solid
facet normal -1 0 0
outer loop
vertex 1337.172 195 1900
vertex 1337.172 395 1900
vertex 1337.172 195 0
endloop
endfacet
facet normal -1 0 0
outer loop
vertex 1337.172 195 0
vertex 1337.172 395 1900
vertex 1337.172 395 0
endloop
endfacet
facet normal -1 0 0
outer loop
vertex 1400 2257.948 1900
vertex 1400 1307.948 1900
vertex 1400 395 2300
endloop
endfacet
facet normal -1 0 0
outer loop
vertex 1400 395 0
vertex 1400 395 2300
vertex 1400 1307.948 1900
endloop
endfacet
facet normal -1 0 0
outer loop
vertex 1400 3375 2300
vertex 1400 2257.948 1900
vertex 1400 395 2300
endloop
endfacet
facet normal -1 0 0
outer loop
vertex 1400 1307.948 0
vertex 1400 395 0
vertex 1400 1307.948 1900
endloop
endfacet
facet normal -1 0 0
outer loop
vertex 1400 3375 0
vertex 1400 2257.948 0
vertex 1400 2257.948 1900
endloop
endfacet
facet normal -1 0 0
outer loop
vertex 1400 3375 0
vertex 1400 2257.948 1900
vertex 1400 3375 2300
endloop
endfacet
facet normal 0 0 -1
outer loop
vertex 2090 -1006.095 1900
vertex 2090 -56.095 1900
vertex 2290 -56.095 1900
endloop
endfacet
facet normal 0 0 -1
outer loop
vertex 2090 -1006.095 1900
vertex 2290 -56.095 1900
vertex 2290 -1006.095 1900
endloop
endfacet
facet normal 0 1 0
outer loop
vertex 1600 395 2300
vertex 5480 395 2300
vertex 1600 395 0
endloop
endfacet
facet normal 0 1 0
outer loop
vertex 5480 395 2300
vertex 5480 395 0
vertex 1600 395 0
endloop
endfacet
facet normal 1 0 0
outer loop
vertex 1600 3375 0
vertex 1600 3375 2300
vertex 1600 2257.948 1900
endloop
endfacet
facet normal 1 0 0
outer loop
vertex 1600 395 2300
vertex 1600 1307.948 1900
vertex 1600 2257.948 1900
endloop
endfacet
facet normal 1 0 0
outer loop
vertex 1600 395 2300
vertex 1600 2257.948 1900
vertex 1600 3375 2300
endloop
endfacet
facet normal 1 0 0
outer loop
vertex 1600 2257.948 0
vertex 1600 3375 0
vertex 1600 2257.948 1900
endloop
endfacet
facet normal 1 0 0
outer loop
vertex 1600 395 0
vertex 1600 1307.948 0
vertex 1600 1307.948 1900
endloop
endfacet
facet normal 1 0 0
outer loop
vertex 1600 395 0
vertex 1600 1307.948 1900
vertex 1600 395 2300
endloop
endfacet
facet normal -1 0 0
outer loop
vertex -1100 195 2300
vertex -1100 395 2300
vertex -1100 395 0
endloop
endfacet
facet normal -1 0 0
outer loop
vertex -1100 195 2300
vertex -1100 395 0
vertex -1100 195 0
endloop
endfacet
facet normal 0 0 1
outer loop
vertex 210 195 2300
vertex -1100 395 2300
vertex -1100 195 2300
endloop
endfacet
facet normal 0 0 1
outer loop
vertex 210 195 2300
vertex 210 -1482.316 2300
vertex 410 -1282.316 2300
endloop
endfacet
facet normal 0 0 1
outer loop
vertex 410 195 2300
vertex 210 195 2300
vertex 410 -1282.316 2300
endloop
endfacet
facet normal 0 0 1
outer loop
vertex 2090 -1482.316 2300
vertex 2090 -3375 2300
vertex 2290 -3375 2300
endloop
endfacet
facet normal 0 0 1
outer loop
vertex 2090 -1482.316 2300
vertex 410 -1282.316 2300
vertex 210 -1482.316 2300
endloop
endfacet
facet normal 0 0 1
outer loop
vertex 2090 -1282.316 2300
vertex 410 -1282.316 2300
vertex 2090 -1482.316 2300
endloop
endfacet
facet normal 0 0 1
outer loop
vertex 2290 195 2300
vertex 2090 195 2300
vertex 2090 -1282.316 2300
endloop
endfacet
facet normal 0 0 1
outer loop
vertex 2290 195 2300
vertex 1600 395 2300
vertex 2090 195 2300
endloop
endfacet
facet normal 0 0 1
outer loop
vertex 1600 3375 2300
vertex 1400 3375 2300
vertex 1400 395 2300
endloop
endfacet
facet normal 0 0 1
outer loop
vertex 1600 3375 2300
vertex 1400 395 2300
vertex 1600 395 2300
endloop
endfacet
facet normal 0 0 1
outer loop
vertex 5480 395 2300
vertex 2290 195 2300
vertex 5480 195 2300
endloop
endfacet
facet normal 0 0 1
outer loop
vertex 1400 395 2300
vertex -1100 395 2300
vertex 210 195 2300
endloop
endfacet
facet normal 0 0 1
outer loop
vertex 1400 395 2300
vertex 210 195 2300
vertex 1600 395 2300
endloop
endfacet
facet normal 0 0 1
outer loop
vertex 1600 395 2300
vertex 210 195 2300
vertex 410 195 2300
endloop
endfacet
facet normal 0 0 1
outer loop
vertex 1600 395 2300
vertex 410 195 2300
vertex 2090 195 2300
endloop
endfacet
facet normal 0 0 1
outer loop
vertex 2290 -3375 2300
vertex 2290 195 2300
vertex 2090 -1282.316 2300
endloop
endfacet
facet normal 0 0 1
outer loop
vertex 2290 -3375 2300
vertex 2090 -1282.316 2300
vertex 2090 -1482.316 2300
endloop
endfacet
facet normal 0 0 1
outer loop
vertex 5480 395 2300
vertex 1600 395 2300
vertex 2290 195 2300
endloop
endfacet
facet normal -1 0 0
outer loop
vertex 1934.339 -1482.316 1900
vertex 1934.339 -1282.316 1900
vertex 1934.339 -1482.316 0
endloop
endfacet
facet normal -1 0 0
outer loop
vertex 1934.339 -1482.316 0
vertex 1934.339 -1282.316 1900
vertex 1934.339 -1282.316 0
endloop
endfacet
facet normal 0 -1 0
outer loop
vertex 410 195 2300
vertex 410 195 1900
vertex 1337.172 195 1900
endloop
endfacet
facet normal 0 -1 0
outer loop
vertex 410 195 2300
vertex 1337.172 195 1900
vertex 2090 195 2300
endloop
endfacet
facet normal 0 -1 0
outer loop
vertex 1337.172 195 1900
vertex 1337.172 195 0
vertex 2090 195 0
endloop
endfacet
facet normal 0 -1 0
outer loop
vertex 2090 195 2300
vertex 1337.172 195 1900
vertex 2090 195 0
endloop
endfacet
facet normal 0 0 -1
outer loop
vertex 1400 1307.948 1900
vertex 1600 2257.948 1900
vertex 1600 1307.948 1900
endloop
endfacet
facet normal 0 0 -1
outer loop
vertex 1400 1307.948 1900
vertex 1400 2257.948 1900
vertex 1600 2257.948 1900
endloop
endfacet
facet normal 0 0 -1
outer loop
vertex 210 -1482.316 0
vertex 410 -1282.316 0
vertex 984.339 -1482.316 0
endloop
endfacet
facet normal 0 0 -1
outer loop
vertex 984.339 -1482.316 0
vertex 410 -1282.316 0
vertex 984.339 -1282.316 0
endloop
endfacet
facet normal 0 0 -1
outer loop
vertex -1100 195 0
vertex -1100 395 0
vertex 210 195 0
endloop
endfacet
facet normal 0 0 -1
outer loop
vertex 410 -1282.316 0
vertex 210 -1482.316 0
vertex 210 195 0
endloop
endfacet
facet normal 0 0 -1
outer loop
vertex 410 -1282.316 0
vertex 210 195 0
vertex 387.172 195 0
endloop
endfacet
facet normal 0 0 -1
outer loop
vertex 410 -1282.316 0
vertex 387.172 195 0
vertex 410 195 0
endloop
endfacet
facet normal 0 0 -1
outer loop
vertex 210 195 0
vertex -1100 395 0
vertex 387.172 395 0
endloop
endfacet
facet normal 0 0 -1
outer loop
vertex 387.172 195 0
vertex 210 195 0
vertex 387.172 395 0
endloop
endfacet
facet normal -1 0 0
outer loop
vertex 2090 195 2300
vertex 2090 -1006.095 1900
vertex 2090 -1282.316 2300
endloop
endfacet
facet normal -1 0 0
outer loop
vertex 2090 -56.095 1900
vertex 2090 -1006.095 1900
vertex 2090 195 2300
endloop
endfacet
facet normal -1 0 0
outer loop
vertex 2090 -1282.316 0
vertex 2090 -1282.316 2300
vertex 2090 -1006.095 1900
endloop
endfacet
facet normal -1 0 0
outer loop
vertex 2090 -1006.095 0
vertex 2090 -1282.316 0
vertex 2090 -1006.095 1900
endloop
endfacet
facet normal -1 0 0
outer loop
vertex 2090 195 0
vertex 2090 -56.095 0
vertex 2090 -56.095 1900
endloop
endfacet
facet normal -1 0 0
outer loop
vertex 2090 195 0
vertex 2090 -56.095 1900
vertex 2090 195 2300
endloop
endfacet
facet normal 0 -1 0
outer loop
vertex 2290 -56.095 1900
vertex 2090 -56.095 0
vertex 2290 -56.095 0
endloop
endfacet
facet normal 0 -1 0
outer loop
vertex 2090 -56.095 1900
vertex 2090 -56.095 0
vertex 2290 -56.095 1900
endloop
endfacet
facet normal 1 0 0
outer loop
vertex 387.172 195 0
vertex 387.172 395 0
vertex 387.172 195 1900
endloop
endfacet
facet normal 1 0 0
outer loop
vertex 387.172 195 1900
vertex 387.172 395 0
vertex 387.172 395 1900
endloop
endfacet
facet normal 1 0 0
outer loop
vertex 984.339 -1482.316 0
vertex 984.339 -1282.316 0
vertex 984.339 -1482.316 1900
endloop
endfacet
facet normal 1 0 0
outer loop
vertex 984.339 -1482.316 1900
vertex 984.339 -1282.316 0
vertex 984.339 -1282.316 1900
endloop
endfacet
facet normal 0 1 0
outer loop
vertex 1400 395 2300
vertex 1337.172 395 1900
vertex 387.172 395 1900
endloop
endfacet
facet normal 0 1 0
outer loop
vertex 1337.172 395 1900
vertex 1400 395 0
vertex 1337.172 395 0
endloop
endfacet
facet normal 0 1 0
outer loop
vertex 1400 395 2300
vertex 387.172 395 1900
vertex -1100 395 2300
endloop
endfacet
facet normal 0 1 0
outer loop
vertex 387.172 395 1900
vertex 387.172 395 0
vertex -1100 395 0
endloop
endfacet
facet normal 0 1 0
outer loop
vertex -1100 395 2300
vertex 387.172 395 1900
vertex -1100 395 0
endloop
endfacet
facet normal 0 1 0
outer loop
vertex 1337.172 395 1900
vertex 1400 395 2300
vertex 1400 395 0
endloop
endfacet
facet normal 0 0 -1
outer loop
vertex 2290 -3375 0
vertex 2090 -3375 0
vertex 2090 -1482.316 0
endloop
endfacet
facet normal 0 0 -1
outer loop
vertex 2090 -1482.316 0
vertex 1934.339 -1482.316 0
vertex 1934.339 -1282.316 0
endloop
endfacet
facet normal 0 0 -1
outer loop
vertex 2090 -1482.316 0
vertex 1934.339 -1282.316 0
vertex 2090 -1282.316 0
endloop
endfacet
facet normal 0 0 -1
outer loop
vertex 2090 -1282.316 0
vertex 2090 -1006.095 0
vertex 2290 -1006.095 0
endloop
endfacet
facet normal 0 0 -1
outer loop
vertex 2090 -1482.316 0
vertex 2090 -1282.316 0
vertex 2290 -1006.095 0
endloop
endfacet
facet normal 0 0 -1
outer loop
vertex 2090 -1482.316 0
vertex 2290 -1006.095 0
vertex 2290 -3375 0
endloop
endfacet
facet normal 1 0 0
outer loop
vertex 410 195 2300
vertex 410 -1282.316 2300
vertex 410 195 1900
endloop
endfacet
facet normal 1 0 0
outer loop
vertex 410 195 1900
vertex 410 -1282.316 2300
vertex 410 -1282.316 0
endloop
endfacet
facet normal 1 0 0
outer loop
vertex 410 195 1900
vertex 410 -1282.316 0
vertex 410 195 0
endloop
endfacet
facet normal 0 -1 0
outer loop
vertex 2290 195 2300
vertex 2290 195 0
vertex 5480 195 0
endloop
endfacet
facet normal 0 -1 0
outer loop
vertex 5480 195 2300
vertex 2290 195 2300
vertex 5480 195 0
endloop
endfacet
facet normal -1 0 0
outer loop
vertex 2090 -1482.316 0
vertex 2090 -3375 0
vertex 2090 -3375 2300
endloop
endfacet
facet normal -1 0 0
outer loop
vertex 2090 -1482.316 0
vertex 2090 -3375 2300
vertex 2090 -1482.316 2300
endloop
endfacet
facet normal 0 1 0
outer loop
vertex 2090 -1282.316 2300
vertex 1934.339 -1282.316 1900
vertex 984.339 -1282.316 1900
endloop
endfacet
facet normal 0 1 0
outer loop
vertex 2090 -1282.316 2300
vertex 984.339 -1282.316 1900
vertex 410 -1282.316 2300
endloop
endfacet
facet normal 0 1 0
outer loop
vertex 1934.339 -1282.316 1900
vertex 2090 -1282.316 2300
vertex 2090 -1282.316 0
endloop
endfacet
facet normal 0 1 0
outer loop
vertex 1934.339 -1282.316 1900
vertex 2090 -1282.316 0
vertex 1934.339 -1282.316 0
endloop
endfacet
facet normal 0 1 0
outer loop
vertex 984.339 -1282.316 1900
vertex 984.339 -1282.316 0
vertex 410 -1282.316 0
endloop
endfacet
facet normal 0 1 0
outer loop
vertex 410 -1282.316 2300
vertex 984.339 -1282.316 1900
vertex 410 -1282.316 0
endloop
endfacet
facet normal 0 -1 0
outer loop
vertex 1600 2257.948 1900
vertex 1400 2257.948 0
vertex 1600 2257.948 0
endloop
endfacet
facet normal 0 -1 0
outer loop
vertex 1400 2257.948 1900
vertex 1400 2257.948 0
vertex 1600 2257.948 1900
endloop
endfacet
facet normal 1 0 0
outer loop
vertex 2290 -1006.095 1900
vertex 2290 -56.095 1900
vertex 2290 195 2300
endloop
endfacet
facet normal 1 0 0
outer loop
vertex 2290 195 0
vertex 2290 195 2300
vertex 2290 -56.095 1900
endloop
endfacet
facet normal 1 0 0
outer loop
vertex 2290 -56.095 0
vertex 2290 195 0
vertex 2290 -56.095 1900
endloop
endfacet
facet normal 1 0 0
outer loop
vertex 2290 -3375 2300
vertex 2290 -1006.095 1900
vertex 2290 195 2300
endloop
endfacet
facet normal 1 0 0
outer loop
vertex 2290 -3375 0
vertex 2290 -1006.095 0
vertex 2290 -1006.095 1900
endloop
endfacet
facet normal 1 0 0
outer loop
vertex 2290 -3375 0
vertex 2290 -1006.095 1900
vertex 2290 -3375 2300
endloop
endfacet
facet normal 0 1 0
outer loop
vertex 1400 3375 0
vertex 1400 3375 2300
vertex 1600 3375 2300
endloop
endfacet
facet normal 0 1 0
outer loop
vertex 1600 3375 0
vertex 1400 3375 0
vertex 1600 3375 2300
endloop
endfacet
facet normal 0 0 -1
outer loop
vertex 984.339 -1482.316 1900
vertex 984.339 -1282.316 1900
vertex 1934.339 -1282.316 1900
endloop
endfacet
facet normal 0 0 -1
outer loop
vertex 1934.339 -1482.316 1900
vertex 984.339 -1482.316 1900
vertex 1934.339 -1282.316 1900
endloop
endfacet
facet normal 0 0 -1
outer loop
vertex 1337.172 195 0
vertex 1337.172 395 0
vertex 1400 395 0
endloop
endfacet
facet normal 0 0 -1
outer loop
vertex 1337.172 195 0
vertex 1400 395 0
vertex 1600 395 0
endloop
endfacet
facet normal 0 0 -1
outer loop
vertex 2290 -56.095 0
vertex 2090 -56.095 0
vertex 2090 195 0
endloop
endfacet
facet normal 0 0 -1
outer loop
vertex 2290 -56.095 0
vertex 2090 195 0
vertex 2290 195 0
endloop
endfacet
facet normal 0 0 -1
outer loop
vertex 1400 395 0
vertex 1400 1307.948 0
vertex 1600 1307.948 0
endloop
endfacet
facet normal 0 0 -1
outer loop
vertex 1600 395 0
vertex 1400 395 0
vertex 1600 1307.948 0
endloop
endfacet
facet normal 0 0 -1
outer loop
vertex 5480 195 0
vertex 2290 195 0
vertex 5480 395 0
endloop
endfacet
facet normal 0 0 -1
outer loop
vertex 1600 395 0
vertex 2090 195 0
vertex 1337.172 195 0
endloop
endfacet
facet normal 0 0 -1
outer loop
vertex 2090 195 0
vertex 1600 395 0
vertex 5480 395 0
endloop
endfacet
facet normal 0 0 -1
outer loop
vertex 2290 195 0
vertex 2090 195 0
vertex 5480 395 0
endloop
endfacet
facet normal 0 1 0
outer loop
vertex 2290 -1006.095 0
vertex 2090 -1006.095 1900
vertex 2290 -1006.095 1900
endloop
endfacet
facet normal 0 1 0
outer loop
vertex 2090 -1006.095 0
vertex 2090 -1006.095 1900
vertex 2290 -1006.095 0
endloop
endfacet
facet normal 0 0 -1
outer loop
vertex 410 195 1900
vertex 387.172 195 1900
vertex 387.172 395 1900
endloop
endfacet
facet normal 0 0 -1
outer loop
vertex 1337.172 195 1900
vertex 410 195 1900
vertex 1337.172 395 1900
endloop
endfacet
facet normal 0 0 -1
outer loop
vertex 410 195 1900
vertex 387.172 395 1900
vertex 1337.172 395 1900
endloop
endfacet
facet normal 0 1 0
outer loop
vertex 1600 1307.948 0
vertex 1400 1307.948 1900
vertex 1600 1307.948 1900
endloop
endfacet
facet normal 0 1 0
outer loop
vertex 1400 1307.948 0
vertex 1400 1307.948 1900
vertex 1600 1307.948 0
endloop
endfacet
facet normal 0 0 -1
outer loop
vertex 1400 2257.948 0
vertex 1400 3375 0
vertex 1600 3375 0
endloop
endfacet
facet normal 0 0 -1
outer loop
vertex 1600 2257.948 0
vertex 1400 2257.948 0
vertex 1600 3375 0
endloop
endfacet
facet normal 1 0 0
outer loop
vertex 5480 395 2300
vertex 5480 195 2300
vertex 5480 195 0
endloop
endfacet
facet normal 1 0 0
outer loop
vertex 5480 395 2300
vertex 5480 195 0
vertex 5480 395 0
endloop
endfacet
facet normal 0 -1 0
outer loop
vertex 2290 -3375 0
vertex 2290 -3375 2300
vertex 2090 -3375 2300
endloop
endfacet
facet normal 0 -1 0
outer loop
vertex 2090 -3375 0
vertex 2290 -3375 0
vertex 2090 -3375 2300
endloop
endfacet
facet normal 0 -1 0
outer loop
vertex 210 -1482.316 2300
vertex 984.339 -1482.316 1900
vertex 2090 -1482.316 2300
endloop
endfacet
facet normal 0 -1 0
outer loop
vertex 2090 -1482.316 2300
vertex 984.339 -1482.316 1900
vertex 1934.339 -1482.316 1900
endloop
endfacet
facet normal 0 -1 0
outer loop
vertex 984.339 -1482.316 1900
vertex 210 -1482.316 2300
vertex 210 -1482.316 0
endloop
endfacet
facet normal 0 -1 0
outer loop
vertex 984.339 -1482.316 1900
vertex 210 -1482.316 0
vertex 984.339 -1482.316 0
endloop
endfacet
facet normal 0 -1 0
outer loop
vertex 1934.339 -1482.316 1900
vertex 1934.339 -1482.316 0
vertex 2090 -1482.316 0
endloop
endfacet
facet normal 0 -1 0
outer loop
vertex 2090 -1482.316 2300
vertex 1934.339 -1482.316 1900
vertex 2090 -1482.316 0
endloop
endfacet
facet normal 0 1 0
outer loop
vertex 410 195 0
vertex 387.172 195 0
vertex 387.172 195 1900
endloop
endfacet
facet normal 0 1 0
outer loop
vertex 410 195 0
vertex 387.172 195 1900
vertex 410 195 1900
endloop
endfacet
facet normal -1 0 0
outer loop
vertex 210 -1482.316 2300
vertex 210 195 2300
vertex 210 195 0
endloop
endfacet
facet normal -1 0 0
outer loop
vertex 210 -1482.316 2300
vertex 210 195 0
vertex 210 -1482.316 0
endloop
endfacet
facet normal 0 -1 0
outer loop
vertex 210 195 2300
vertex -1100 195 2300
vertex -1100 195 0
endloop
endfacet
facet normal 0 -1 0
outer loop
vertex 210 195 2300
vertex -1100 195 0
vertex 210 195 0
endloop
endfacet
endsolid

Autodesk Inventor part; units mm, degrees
ref_plane "YZ Plane" through (0, 0, 0) normal (1, 0, 0) x (0, 1, 0)
ref_plane "XZ Plane" through (0, 0, 0) normal (0, 1, 0) x (-1, 0, 0)
ref_plane "XY Plane" through (0, 0, 0) normal (0, 0, 1) x (1, 0, 0)
ref_plane "Arbeitsebene1" through (0, 0, 0) normal (0, 0, 1) x (1, 0, 0)
sketch "Skizze1" plane through (0, 0, 0) normal (0, 0, 1) x (1, 0, 0)
  line L0 (5680, -3575) -> (5680, 3575) projected
  line L1 (5680, 3575) -> (-5680, 3575) projected
  line L2 (-5680, 3575) -> (-5680, -3575) projected
  line L3 (-5680, -3575) -> (5680, -3575) projected
  line L4 (1400, 3375) -> (1600, 3375)
  line L5 (1600, 3375) -> (1600, 395)
  line L6 (1400, 395) -> (1400, 3375)
  line L7 (-1100, 395) -> (-1100, 195)
  line L8 (5480, 195) -> (5480, 395)
  line L9 (2290, 195) -> (2290, -3375)
  line L10 (2290, -3375) -> (2090, -3375)
  line L11 (5480, 395) -> (1600, 395)
  line L12 (1400, 395) -> (-1100, 395)
  line L13 (2290, 195) -> (5480, 195)
  line L14 (2090, -1282.3157) -> (410, -1282.3157)
  line L15 (210, -646.2385) -> (210, -1482.3157)
  line L16 (210, -1482.3157) -> (2090, -1482.3157)
  line L17 (210, 195) -> (210, -646.2385)
  line L18 (410, -1282.3157) -> (410, 195)
  line L19 (2090, -3375) -> (2090, -1482.3157)
  line L20 (2090, -1282.3157) -> (2090, 195)
  line L21 (-1100, 195) -> (210, 195)
  line L22 (410, 195) -> (2090, 195)
  line L23 (1430, 3375) -> (1430, 1814.9045) projected
  line L24 (1430, 1814.9045) -> (-1230, 1814.9045) projected
  line L25 (-1230, 1814.9045) -> (-1230, 3375) projected
  line L26 (-1230, 3375) -> (1430, 3375) projected
  dimension "d1" = 200
  dimension "d2" = 200
  dimension "d3" = 200
  dimension "d4" = 2980
  dimension "d6" = 200
  dimension "d8" = 200
  dimension "d9" = 2500
  dimension "d16" = 3880
  dimension "d26" = 200
  dimension "d27" = 200
  dimension "d28" = 1310
  dimension "d29" = 200
  dimension "d31" = 1680
extrude "Extrusion4" add sketch "Skizze1" along normal blind 2300 contours L4 L23 L24 L6 | L4 L5 L11 L8 L13 L9 L10 L19 L16 L15 L17 L21 L7 L12 L6 L24 L23
sketch "Skizze4" plane through (1400, 395, 0) normal (-1, 0, 0) x (0, 0, 1)
  line L0 (0, 0) -> (0, 2980) projected
  line L1 (0, 0) -> (2300, 0) projected
  line L2 (2300, 2980) -> (2300, 0) projected
  line L3 (0, 2980) -> (2300, 2980) projected
  line L4 (0, 0) -> (0, 2980) projected
  line L5 (0, 1862.9475) -> (1900, 1862.9475)
  line L6 (1900, 1862.9475) -> (1900, 912.9475)
  line L7 (1900, 912.9475) -> (0, 912.9475)
  line L8 (0, 912.9475) -> (0, 1862.9475)
  dimension "d34" = 950
  dimension "d35" = 1900
extrude "Extrusion5" cut sketch "Skizze4" against normal up to surface (200 mm away) contours L0 L5 L6 L7
sketch "Skizze5" plane through (-1100, 395, 0) normal (0, 1, 0) x (1, 0, 0)
  line L0 (0, 0) -> (2500, 0) projected
  line L1 (0, 0) -> (0, -2300) projected
  line L2 (2500, -2300) -> (0, -2300) projected
  line L3 (2500, 0) -> (2500, -2300) projected
  line L4 (0, 0) -> (2500, 0) projected
  line L5 (2437.1725, 0) -> (1487.1725, 0)
  line L6 (1487.1725, 0) -> (1487.1725, -1900)
  line L7 (1487.1725, -1900) -> (2437.1725, -1900)
  line L8 (2437.1725, -1900) -> (2437.1725, 0)
  dimension "d38" = 950
  dimension "d39" = 1900
extrude "Extrusion6" cut sketch "Skizze5" against normal up to surface (200 mm away) contours L0 L8 L7 L6
sketch "Skizze6" plane through (2090, -1282.3157, 0) normal (-1, 0, 0) x (0, 0, 1)
  line L0 (0, 0) -> (0, 1477.3157) projected
  line L1 (0, 0) -> (2300, 0) projected
  line L2 (2300, 1477.3157) -> (2300, 0) projected
  line L3 (0, 1477.3157) -> (2300, 1477.3157) projected
  line L4 (0, 0) -> (0, 1477.3157) projected
  line L5 (0, 1226.2205) -> (1900, 1226.2205)
  line L6 (1900, 1226.2205) -> (1900, 276.2205)
  line L7 (1900, 276.2205) -> (0, 276.2205)
  line L8 (0, 276.2205) -> (0, 1226.2205)
  dimension "d42" = 950
  dimension "d43" = 1900
extrude "Extrusion7" cut sketch "Skizze6" against normal up to surface (200 mm away) contours L0 L5 L6 L7
sketch "Skizze7" plane through (410, -1282.3157, 0) normal (0, 1, 0) x (1, 0, 0)
  line L0 (0, 0) -> (1680, 0) projected
  line L1 (0, 0) -> (0, -2300) projected
  line L2 (1680, -2300) -> (0, -2300) projected
  line L3 (1680, 0) -> (1680, -2300) projected
  line L4 (0, 0) -> (1680, 0) projected
  line L5 (1524.3394, 0) -> (574.3394, 0)
  line L6 (574.3394, 0) -> (574.3394, -1900)
  line L7 (574.3394, -1900) -> (1524.3394, -1900)
  line L8 (1524.3394, -1900) -> (1524.3394, 0)
  dimension "d46" = 950
  dimension "d47" = 1900
extrude "Extrusion8" cut sketch "Skizze7" against normal up to surface (200 mm away) contours L0 L8 L7 L6
properties part number "Wände_oben" material "Beton"
